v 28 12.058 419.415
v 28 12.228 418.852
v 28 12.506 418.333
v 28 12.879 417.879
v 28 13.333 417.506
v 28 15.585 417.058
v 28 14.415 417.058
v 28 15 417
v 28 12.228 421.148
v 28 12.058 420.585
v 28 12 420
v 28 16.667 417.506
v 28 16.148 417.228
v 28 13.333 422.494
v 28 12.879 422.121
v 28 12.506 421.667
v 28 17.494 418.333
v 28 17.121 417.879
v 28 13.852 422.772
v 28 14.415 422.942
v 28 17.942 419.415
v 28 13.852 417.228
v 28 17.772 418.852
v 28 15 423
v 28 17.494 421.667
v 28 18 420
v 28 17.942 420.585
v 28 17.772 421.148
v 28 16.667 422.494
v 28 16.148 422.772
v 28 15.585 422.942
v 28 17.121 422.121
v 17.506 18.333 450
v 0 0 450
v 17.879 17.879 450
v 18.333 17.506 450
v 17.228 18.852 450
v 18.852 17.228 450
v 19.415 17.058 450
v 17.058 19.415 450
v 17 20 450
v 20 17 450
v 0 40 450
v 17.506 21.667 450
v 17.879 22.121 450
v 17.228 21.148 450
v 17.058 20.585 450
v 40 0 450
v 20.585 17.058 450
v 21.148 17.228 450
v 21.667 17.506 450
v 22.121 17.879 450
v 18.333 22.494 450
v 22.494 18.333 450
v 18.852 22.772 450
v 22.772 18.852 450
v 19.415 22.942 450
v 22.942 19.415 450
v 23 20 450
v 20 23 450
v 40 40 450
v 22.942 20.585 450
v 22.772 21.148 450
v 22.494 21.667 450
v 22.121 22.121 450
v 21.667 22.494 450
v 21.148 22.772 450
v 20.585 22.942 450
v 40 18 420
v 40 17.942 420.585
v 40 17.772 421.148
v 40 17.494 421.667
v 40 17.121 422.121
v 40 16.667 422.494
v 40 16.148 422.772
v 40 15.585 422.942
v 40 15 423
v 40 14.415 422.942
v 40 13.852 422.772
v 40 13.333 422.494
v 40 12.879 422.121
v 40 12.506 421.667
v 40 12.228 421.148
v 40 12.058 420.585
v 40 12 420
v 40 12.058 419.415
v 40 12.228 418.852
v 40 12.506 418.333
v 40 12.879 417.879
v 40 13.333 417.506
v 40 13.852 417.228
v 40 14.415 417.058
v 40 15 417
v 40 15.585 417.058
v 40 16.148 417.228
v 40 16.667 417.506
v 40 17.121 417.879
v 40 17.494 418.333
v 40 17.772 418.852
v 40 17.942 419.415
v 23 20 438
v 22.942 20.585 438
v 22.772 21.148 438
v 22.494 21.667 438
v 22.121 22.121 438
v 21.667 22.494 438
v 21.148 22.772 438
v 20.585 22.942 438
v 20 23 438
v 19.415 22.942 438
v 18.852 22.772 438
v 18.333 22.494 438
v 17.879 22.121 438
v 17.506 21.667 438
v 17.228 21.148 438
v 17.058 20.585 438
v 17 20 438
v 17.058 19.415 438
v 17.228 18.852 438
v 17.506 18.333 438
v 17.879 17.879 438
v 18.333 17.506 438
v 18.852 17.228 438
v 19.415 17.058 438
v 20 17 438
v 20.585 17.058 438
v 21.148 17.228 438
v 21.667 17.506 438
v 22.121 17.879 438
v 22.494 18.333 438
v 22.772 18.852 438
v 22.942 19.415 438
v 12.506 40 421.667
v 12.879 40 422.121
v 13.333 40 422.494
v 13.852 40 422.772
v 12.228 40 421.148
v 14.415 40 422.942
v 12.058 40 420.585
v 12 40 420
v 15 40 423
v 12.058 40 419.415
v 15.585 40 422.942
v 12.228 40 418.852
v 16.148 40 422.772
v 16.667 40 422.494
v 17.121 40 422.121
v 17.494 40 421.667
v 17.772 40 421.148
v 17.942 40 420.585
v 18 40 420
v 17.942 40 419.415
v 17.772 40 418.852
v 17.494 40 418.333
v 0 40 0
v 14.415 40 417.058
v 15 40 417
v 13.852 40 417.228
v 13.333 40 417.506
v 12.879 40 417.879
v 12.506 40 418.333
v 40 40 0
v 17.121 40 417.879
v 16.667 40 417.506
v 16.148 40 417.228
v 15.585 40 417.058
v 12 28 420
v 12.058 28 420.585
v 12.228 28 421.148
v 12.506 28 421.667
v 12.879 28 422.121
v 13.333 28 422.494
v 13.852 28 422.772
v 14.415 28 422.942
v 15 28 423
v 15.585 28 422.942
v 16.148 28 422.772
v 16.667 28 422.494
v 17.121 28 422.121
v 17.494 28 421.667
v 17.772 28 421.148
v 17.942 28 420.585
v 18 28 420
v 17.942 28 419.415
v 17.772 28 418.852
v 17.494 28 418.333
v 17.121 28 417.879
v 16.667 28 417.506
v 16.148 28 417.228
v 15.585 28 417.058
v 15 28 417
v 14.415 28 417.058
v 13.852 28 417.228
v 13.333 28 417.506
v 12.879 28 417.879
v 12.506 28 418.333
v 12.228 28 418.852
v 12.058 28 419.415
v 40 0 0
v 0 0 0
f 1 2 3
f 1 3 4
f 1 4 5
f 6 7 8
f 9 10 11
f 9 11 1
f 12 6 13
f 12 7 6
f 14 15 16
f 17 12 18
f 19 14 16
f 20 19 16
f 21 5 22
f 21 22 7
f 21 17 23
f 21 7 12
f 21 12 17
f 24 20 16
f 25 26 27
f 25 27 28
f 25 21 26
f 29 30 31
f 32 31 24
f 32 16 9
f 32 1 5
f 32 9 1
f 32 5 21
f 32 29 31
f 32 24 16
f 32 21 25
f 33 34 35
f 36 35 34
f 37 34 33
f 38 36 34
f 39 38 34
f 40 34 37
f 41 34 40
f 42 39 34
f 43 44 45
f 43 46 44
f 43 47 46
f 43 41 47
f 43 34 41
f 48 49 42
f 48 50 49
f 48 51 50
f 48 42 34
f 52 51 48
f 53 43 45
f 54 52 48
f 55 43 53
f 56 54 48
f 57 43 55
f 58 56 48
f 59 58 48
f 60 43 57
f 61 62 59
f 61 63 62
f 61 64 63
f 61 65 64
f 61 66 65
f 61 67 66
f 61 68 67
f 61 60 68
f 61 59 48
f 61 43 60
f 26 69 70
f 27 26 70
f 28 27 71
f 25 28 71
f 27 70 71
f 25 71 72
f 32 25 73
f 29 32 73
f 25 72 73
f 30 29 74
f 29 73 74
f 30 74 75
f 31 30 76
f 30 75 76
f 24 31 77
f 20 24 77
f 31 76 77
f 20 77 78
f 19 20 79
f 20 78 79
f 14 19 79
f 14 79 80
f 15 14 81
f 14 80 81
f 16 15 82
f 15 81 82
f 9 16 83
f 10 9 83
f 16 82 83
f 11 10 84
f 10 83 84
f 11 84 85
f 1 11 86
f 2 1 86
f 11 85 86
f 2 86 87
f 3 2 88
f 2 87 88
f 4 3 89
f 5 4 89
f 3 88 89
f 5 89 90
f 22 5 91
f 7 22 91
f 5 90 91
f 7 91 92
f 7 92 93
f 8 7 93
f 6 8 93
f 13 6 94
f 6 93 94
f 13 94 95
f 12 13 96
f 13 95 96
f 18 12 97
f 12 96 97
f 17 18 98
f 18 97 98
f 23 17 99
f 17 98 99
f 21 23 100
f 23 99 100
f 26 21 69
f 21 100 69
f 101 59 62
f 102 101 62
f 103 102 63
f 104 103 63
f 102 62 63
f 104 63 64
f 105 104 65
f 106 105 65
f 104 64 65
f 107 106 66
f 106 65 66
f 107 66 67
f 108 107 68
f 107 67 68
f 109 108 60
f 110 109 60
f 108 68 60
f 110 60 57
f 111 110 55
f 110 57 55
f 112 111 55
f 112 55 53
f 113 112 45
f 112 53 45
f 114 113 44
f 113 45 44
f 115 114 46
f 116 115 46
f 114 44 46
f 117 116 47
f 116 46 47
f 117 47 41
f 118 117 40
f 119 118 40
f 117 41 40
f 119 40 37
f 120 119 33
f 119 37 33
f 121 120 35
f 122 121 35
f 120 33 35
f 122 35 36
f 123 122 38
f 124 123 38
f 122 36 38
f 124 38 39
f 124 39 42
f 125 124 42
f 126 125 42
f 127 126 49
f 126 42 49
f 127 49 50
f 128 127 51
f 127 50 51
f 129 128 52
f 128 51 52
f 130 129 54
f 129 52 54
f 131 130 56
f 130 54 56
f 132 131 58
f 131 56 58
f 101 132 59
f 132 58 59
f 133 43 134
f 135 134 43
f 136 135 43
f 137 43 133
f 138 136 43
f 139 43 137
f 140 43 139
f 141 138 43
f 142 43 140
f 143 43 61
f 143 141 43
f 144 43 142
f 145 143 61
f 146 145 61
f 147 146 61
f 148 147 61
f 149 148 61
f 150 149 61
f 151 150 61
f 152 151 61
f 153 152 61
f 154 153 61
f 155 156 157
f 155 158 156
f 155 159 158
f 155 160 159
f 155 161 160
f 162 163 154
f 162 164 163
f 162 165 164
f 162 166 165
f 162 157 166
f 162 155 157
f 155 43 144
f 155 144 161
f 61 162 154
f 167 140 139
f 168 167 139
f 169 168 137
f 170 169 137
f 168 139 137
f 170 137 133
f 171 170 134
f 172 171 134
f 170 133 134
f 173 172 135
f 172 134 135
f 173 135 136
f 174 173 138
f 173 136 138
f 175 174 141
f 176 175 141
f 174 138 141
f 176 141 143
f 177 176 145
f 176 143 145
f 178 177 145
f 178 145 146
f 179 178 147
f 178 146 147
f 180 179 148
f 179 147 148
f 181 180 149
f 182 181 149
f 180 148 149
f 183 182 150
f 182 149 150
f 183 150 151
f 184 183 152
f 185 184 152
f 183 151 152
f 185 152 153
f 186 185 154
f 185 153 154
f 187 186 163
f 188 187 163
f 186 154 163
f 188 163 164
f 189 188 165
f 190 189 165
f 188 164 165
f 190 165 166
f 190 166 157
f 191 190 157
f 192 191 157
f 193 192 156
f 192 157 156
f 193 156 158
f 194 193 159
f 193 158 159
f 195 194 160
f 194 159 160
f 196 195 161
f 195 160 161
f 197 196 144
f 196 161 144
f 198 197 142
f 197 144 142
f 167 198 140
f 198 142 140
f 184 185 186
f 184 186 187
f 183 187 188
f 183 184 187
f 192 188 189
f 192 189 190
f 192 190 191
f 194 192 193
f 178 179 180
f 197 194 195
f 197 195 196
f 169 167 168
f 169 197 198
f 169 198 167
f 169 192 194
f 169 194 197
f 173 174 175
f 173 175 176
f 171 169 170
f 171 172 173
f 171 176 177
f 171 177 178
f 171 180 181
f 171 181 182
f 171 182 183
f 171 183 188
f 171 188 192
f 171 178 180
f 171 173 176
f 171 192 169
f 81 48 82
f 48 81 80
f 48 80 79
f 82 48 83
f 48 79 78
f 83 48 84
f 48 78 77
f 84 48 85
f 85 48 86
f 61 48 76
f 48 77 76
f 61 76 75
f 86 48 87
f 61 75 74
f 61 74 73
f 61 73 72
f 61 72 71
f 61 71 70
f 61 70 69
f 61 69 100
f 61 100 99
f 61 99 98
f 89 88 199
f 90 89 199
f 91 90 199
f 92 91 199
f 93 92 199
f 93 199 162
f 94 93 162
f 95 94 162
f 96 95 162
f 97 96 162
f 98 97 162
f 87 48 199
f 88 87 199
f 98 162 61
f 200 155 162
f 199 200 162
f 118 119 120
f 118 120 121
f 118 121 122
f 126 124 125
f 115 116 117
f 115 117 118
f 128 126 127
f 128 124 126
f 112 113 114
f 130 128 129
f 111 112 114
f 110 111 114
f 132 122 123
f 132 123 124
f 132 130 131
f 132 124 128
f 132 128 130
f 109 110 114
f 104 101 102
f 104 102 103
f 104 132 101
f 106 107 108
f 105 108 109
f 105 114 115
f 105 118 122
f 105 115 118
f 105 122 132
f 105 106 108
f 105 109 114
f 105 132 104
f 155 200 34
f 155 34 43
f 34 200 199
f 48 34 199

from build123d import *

# Parameters (mm, degrees)
F0_W     = 40
F0_H     = 40
F1_DEPTH = 450
F3_R     = 3
F4_DEPTH = 12
F5_R     = 3
F6_DEPTH = 12
F7_R     = 3
F8_DEPTH = 12


with BuildPart() as f1:
    # F0 (on Top) → F1 (new body)
    with BuildSketch(Plane.XY):
        with Locations((20, 20)):
            Rectangle(F0_W, F0_H)
    extrude(amount=F1_DEPTH)

    # F3 (on face) → F4 (cut)
    with BuildSketch(Plane.YZ.offset(40)):
        with Locations((15, 420)):
            Circle(F3_R)
    extrude(amount=-F4_DEPTH, mode=Mode.SUBTRACT)

    # F5 (on face) → F6 (cut)
    with BuildSketch(Plane(origin=(0, 40, 0), x_dir=(-1, 0, 0), z_dir=(0, 1, 0))):
        with Locations((-15, 420)):
            Circle(F5_R)
    extrude(amount=-F6_DEPTH, mode=Mode.SUBTRACT)

    # F7 (on face) → F8 (cut)
    with BuildSketch(Plane.XY.offset(450)):
        with Locations((20, 20)):
            Circle(F7_R)
    extrude(amount=-F8_DEPTH, mode=Mode.SUBTRACT)


solid = f1.part
